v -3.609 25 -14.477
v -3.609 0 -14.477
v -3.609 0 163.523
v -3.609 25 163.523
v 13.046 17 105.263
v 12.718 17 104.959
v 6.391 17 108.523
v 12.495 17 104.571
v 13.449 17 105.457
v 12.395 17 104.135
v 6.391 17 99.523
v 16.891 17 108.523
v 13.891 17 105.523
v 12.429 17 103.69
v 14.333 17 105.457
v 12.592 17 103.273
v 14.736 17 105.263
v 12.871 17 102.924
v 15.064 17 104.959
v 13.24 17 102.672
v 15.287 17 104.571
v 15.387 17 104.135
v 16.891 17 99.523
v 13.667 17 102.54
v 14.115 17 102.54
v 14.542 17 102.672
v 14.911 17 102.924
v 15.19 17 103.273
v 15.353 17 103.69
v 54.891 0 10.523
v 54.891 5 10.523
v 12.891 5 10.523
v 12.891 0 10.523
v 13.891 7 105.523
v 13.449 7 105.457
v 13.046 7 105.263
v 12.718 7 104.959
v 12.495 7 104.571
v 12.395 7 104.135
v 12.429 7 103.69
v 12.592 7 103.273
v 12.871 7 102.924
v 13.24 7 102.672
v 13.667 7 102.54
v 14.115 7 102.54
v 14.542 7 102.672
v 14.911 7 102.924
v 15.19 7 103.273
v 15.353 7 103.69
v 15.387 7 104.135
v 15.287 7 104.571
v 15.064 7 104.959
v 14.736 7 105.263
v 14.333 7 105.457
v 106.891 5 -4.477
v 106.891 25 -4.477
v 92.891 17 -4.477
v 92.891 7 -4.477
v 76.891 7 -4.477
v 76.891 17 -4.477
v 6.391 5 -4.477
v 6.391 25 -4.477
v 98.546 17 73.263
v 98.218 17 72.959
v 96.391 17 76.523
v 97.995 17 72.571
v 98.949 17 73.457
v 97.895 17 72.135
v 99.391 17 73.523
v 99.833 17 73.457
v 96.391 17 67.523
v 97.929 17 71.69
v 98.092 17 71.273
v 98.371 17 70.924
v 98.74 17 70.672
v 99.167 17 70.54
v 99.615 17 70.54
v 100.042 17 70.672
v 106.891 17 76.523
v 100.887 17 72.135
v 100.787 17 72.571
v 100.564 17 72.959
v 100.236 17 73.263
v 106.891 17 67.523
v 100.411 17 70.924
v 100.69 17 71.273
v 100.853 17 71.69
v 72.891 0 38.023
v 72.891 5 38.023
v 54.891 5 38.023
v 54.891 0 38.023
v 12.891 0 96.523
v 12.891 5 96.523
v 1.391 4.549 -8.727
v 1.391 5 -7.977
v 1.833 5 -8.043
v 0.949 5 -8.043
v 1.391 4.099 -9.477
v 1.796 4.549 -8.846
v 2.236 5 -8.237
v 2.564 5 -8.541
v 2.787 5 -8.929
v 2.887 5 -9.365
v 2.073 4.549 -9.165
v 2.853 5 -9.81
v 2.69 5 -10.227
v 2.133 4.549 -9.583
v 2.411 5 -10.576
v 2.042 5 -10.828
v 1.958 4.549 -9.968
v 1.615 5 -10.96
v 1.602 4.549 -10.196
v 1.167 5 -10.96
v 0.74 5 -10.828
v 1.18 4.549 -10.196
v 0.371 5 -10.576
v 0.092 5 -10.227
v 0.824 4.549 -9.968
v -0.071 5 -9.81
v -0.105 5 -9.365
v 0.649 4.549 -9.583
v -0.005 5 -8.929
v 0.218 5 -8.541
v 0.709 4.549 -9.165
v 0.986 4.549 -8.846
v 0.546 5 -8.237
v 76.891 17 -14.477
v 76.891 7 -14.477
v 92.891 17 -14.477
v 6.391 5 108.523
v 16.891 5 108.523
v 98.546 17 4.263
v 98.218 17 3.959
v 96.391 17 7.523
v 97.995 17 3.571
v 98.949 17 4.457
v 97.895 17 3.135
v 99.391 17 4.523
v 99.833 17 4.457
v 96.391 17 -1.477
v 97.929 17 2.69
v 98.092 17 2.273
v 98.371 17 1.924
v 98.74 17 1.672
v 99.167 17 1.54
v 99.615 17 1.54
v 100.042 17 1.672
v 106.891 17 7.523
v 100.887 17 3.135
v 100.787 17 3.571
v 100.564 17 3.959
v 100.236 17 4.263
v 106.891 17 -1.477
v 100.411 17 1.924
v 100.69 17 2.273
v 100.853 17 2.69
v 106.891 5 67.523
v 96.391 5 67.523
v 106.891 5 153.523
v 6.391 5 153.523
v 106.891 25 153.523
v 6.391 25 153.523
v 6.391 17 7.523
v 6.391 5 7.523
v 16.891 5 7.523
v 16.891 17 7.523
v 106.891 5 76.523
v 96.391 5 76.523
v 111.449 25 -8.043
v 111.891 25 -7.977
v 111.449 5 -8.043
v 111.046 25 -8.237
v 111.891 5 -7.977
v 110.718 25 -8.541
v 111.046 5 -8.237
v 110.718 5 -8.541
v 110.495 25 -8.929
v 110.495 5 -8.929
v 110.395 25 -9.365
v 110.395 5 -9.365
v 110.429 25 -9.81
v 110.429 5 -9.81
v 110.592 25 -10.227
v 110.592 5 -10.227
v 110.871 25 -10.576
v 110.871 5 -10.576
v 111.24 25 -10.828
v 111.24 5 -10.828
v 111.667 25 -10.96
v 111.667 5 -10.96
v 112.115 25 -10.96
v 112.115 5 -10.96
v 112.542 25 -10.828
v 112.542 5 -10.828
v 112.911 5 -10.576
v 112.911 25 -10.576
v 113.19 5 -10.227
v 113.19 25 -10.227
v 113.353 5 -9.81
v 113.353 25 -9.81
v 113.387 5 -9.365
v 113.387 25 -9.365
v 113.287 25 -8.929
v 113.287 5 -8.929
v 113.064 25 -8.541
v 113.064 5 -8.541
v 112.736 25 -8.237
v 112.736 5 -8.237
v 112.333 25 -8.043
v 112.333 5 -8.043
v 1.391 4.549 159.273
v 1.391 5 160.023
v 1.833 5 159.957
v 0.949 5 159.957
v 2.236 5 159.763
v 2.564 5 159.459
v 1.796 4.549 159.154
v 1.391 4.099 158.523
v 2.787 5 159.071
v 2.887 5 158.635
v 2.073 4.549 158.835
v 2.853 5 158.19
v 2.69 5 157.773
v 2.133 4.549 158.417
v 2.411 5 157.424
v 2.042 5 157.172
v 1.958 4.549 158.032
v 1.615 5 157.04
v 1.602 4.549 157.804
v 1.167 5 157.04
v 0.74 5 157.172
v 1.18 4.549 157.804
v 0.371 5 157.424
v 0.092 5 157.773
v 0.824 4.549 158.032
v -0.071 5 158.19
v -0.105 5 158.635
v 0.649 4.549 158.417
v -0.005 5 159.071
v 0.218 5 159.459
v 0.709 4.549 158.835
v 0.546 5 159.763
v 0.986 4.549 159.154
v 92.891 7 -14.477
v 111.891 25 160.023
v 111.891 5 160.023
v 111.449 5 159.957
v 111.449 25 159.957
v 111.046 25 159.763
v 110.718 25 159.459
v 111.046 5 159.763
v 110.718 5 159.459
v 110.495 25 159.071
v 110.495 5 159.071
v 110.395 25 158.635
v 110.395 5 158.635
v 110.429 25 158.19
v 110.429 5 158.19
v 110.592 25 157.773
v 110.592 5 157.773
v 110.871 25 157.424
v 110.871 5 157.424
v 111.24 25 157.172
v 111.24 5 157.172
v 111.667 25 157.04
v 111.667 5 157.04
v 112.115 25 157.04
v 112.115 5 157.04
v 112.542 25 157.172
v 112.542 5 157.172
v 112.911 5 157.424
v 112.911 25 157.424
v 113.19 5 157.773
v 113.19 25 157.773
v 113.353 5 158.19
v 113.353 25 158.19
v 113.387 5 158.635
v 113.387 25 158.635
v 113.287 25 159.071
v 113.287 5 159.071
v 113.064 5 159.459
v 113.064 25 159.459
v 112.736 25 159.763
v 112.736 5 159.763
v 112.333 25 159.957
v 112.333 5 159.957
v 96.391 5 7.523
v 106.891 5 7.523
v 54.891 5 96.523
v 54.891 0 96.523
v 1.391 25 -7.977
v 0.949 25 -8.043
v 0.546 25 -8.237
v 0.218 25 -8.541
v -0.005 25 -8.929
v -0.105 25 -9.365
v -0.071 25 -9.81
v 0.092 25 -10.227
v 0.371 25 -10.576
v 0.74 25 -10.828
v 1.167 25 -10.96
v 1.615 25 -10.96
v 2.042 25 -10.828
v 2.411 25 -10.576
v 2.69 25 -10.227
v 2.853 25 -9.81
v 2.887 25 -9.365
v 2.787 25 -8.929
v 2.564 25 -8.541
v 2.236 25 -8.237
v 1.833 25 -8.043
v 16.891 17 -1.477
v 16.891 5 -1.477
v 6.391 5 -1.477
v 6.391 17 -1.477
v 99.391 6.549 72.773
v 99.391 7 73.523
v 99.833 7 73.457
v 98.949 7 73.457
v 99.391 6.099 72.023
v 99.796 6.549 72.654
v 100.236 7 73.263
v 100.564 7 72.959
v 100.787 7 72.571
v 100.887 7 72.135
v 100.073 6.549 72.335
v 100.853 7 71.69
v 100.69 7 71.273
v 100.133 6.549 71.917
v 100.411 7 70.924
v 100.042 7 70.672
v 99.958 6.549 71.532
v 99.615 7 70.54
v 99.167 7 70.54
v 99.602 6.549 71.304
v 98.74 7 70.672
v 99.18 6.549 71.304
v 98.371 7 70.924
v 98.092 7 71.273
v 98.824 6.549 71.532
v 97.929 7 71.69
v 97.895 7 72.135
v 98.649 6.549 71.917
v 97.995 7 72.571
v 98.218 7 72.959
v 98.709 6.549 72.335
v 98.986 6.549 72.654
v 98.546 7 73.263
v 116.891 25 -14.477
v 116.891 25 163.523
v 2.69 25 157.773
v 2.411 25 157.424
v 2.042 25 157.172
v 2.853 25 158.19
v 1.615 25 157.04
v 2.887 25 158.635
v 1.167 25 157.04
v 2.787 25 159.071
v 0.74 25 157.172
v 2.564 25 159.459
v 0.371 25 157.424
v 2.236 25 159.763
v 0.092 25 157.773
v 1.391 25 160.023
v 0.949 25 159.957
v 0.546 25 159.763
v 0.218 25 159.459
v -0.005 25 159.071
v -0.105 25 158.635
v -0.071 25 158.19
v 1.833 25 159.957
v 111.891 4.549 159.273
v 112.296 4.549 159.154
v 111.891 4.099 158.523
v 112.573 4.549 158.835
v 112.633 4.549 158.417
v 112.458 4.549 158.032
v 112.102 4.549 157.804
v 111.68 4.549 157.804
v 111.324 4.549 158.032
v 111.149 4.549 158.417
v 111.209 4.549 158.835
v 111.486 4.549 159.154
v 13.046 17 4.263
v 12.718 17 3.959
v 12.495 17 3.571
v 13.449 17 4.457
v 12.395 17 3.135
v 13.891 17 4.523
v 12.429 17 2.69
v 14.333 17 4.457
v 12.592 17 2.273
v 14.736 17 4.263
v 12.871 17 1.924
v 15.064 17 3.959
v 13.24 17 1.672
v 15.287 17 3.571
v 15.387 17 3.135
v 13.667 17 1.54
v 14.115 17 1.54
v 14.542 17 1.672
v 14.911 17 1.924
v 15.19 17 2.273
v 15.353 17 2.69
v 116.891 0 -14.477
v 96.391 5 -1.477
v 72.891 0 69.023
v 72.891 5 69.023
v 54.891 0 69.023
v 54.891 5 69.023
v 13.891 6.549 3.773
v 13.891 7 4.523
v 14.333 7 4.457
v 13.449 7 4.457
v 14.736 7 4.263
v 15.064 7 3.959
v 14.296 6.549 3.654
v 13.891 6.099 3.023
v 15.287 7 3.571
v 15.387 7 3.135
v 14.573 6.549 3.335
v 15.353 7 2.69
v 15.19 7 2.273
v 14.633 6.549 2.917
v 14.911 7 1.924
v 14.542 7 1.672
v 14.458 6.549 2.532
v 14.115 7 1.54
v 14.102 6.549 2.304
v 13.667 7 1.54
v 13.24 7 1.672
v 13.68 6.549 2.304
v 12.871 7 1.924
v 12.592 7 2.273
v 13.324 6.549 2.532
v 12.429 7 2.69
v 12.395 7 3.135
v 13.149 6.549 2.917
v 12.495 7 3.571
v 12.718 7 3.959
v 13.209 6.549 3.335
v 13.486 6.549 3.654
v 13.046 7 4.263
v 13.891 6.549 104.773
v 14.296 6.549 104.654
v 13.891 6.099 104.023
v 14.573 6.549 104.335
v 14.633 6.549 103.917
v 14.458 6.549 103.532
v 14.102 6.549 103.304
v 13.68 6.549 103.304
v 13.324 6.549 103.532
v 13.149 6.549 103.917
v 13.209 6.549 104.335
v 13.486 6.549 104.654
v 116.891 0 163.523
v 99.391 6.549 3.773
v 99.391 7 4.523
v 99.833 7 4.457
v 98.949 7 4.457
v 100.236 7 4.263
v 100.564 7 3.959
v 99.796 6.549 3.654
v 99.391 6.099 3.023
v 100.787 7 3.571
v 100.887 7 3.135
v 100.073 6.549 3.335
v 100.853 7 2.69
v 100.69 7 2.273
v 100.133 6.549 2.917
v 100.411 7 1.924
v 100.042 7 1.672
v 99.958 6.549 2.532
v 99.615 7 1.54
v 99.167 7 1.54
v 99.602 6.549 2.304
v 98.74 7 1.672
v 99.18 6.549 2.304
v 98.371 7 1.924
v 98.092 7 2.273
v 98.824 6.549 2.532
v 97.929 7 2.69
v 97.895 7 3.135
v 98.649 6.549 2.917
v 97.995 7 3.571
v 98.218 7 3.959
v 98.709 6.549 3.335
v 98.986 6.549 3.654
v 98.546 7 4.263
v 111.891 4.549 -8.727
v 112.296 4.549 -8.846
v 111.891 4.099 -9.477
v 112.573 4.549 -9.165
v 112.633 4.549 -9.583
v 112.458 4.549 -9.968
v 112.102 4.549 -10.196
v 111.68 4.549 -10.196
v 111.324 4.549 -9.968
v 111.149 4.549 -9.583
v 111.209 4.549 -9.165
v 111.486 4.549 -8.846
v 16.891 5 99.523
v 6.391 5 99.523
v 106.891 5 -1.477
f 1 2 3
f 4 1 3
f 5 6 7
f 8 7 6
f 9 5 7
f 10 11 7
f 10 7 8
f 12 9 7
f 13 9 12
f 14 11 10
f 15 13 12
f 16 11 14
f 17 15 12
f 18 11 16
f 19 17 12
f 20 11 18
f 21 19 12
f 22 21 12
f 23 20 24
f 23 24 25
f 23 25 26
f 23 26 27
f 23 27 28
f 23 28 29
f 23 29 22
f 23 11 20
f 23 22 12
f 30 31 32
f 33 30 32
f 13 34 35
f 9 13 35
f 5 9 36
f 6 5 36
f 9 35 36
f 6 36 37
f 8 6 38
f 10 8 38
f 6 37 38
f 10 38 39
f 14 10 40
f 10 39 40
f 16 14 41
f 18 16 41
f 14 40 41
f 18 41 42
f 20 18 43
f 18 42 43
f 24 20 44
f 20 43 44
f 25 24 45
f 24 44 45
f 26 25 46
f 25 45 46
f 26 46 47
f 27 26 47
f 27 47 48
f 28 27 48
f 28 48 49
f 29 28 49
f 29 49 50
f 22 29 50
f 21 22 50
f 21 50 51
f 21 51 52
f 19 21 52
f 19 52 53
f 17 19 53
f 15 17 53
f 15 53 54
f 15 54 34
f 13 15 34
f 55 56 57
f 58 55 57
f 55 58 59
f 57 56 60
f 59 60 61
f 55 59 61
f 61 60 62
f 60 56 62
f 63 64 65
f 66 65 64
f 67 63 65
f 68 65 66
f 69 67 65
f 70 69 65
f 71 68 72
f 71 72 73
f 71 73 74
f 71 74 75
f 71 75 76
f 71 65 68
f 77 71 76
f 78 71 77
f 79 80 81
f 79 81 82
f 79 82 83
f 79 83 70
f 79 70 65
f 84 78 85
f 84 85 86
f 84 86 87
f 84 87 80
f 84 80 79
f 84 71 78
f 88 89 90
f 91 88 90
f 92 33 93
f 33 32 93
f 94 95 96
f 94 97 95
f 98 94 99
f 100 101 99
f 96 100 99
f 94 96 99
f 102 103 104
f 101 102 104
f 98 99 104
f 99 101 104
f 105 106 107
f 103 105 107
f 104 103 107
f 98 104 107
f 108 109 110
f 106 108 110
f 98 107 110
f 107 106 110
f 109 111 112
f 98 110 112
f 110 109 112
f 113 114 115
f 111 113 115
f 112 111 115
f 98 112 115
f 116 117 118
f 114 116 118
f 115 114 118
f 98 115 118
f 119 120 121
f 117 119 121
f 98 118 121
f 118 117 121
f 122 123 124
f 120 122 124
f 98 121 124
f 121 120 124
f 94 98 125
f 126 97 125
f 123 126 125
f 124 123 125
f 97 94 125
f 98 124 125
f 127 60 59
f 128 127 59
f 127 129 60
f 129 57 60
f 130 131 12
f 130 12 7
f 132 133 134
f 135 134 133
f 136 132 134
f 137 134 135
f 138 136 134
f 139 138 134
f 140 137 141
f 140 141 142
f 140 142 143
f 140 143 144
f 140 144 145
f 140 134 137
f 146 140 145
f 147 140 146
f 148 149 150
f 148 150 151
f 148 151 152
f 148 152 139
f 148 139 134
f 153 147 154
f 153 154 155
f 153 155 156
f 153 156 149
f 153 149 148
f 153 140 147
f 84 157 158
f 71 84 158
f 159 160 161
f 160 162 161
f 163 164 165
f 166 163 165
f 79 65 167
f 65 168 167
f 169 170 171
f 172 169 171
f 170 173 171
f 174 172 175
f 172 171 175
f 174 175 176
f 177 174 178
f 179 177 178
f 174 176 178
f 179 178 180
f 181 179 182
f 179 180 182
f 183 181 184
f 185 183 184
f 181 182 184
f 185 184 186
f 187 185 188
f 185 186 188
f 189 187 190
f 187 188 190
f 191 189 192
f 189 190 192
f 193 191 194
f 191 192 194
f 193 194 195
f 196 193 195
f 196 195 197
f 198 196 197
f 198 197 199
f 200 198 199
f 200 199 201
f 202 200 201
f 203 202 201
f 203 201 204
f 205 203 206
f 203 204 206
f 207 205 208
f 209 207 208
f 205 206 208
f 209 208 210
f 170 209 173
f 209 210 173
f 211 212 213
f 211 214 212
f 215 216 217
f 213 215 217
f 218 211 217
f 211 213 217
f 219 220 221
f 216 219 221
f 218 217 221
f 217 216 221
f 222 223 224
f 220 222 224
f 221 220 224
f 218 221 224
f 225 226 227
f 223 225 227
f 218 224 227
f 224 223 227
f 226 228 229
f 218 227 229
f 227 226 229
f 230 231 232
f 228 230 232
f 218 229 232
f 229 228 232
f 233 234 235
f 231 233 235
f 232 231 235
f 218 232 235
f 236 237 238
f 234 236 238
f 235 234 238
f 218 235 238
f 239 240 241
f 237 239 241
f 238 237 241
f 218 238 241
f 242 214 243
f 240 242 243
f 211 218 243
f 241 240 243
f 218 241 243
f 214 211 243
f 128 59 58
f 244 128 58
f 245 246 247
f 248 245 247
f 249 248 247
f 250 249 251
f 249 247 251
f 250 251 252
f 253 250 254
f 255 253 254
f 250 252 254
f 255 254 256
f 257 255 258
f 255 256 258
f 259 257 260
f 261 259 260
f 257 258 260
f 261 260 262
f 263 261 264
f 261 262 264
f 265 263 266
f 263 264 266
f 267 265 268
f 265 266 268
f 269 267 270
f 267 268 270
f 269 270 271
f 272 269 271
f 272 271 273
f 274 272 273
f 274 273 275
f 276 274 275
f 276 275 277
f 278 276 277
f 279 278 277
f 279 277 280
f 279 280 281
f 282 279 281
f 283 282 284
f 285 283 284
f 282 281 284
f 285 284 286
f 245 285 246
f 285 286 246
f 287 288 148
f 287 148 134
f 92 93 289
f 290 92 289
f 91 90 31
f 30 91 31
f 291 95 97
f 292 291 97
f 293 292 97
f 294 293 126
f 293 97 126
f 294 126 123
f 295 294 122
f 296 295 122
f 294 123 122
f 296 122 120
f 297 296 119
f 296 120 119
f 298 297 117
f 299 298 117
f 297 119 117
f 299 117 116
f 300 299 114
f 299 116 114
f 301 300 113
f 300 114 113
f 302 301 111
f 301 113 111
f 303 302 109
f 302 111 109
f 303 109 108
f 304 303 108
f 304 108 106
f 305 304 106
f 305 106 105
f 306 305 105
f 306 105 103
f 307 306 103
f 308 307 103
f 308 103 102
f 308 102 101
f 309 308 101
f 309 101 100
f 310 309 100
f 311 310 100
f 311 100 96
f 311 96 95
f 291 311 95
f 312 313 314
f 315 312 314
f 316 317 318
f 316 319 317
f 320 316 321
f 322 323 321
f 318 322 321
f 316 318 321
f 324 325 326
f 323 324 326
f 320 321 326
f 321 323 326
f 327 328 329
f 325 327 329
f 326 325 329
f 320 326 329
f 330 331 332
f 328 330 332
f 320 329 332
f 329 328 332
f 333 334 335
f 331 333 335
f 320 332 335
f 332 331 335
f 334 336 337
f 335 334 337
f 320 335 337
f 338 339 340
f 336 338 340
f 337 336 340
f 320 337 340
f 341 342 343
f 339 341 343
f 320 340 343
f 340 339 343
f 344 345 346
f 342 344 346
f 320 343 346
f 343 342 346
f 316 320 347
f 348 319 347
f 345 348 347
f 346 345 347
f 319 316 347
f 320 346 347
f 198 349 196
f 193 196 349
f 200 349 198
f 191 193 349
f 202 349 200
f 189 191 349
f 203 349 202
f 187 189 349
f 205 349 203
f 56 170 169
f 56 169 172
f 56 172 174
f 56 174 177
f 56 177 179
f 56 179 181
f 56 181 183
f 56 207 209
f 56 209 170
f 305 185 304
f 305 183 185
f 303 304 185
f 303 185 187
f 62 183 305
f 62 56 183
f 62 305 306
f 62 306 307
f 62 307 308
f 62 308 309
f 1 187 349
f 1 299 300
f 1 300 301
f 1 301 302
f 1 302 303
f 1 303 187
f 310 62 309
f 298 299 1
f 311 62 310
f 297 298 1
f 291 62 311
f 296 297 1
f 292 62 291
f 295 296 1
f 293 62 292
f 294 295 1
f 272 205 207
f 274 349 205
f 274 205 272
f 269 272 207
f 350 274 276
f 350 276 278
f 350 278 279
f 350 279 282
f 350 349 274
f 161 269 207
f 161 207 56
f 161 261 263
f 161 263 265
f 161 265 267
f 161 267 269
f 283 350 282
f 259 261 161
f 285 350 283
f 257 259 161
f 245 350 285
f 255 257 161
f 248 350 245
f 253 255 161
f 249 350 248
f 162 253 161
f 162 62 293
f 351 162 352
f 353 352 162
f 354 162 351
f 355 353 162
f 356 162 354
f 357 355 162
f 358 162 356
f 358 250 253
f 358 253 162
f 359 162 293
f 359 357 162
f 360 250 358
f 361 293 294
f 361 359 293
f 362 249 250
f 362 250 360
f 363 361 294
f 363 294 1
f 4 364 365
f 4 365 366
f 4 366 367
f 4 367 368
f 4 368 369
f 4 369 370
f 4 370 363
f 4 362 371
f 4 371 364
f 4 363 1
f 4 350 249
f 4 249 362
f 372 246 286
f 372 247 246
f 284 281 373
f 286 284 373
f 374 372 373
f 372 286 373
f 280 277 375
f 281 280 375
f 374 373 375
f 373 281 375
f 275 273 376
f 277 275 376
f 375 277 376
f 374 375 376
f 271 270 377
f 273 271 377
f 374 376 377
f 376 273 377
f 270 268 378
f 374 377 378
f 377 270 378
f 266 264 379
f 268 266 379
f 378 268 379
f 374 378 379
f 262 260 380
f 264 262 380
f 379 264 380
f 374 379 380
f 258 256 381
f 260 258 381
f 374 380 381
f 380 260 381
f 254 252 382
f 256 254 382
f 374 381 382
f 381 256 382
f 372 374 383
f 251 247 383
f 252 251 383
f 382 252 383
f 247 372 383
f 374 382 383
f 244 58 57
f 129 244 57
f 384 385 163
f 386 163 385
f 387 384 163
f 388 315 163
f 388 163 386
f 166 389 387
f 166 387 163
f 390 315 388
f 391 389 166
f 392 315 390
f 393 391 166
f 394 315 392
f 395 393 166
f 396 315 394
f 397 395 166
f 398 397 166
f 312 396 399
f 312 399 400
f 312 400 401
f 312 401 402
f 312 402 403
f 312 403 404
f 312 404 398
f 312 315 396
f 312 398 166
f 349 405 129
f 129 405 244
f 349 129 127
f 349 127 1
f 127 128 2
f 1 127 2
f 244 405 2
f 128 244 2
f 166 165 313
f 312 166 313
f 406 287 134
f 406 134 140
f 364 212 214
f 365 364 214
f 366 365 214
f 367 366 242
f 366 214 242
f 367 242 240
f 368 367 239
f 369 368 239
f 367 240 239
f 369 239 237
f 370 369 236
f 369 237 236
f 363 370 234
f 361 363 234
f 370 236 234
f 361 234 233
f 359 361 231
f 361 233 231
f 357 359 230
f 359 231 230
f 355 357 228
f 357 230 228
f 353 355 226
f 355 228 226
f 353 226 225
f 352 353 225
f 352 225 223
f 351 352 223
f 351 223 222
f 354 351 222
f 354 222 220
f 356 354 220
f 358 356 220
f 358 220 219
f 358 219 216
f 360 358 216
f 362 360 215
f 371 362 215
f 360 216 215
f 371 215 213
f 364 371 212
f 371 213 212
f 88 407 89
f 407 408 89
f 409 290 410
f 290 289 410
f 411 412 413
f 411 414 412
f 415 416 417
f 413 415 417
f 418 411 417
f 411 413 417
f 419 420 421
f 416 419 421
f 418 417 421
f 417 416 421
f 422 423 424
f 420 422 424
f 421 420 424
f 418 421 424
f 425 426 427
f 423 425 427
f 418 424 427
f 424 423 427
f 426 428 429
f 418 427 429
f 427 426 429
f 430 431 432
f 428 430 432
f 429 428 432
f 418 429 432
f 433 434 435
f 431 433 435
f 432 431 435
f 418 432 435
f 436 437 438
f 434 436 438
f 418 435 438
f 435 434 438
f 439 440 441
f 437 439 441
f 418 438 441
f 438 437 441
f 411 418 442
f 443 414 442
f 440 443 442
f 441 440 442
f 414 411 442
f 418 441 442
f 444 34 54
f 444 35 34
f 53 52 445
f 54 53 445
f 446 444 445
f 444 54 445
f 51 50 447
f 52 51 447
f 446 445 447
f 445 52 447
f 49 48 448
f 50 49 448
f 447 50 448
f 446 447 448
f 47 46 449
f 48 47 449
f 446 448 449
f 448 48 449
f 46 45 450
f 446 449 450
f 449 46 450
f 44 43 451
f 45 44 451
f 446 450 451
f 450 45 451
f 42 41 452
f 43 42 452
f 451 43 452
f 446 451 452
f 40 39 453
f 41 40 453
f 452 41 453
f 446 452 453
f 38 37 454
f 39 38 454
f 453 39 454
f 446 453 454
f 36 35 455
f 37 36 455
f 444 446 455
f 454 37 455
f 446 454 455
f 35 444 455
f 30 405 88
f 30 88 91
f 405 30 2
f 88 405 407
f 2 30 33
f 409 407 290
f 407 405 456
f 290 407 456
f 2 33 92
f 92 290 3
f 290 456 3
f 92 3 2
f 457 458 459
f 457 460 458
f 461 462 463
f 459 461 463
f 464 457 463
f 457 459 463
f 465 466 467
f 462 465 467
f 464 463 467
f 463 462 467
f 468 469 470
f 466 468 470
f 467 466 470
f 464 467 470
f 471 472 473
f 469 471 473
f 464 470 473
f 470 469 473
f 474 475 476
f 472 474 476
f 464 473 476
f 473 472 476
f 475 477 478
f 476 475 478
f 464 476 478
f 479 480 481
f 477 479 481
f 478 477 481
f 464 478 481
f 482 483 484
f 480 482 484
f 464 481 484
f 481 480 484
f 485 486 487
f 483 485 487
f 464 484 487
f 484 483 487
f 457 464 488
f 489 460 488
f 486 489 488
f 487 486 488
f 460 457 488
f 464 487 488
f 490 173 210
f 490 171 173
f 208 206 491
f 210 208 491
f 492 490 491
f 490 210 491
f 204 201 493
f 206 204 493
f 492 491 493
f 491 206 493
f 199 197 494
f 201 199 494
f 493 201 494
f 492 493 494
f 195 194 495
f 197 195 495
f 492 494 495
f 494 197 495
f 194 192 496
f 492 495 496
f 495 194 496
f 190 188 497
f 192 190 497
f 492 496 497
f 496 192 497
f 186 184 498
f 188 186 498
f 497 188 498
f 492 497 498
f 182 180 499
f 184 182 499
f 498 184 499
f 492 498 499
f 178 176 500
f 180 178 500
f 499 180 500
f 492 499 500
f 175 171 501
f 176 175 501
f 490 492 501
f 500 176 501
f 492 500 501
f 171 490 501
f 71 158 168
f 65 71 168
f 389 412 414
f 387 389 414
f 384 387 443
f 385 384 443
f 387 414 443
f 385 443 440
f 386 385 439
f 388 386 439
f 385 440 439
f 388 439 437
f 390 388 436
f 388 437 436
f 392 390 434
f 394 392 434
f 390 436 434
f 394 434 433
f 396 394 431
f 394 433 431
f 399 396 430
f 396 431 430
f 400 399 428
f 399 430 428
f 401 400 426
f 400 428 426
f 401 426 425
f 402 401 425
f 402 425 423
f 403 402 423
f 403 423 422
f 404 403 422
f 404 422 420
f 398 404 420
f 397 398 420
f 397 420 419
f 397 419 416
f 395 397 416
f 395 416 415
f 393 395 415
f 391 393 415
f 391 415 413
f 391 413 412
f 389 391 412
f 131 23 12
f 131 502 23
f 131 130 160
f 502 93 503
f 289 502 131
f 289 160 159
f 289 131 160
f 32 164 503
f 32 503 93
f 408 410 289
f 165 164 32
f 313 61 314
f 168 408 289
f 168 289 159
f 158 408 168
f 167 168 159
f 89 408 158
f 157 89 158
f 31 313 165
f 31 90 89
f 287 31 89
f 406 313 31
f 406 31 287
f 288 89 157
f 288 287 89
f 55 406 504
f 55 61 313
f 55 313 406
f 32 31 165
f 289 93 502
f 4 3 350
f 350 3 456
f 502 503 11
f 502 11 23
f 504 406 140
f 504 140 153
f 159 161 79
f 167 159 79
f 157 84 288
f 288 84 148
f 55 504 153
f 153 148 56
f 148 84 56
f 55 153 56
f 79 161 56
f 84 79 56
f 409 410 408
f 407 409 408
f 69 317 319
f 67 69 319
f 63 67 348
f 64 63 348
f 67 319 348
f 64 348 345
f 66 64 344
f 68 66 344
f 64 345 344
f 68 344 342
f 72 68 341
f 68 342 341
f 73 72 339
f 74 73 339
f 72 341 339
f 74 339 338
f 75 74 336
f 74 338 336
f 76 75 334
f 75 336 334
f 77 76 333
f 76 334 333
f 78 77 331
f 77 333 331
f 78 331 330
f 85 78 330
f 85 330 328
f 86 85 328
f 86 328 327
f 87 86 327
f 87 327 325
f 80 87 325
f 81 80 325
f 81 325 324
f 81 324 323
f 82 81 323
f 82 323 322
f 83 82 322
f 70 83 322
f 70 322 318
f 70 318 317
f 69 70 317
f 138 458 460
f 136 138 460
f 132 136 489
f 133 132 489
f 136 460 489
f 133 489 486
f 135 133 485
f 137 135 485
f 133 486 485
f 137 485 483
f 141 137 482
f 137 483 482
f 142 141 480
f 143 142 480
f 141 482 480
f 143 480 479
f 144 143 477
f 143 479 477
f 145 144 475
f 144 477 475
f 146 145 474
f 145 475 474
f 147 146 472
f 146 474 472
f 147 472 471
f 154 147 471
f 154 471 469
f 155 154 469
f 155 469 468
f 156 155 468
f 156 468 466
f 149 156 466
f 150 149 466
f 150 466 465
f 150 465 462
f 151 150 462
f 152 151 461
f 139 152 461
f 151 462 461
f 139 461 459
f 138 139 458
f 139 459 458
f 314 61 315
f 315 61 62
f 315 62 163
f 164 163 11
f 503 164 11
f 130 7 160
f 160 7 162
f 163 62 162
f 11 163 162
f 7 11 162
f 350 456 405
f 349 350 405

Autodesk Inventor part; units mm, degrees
ref_plane "YZ Plane" through (0, 0, 0) normal (1, 0, 0) x (0, 1, 0)
ref_plane "XZ Plane" through (0, 0, 0) normal (0, 1, 0) x (-1, 0, 0)
ref_plane "XY Plane" through (0, 0, 0) normal (0, 0, 1) x (1, 0, 0)
sketch "Sketch1" plane through (0, 0, 0) normal (0, 1, 0) x (-1, 0, 0)
  line L0 (3.609, 163.5234) -> (-116.891, 163.5234)
  line L1 (-116.891, 163.5234) -> (-116.891, -14.4766)
  line L2 (-116.891, -14.4766) -> (3.609, -14.4766)
  line L3 (3.609, -14.4766) -> (3.609, 163.5234)
  dimension "d1" = 178
  dimension "d2" = 120.5
extrude "Extrusion1" add sketch "Sketch1" along normal blind 25
sketch "Sketch2" plane through (0, 25, 0) normal (0, 1, 0) x (1, 0, 0)
  line L0 (6.391, -153.5234) -> (106.891, -153.5234)
  line L1 (106.891, -153.5234) -> (106.891, 4.4766)
  line L2 (106.891, 4.4766) -> (6.391, 4.4766)
  line L3 (6.391, 4.4766) -> (6.391, -153.5234)
  line L4 (-3.609, -163.5234) -> (116.891, -163.5234) projected
  line L5 (116.891, -163.5234) -> (116.891, 14.4766) projected
  point P0 (0, 0)
  dimension "d5" = 158
  dimension "d6" = 100.5
  dimension "d7" = 10
  dimension "d8" = 10
extrude "Extrusion2" cut sketch "Sketch2" against normal blind 20
sketch "Sketch3" plane through (0, 5, 0) normal (0, 1, 0) x (1, 0, 0)
  line L0 (12.891, -96.5234) -> (54.891, -96.5234)
  line L1 (54.891, -96.5234) -> (54.891, -10.5234)
  line L2 (54.891, -10.5234) -> (12.891, -10.5234)
  line L3 (12.891, -10.5234) -> (12.891, -96.5234)
  line L4 (106.891, -153.5234) -> (6.391, -153.5234) projected
  line L5 (6.391, 4.4766) -> (106.891, 4.4766) projected
  line L6 (6.391, -153.5234) -> (6.391, 4.4766) projected
  line L7 (54.891, -69.0234) -> (72.891, -69.0234)
  line L8 (72.891, -69.0234) -> (72.891, -38.0234)
  line L9 (72.891, -38.0234) -> (54.891, -38.0234)
  line L10 (54.891, -38.0234) -> (54.891, -69.0234)
  line L11 (106.891, 4.4766) -> (106.891, -153.5234) projected
  line L12 (12.891, -55.0234) -> (106.891, -55.0234)
  point P0 (0, 0)
  dimension "d11" = 57
  dimension "d12" = 15
  dimension "d13" = 6.5
  dimension "d14" = 0
  dimension "d15" = 42
  dimension "d16" = 34
  dimension "d17" = 42.5
  dimension "d18" = 84.5
  dimension "d19" = 41.5
  dimension "d20" = 44.5
  dimension "d21" = 14
extrude "Extrusion3" cut sketch "Sketch3" against normal through all contours L3 L12 L1 L0 | L3 L2 L1 L12 | L1 L12 L8 L7 | L1 L9 L8 L12
sketch "Sketch4" plane through (0, 5, 0) normal (0, 1, 0) x (1, 0, 0)
  line L0 (6.391, -7.5234) -> (16.891, -7.5234)
  line L1 (16.891, -7.5234) -> (16.891, 1.4766)
  line L2 (16.891, 1.4766) -> (6.391, 1.4766)
  line L3 (6.391, 1.4766) -> (6.391, -7.5234)
  line L4 (6.391, -153.5234) -> (6.391, 4.4766) projected
  line L5 (6.391, 4.4766) -> (106.891, 4.4766) projected
  line L6 (6.391, -153.5234) -> (6.391, 4.4766) projected
  line L7 (6.391, -53.5234) -> (106.891, -53.5234)
  line L8 (12.891, -10.5234) -> (54.891, -10.5234) projected
  line L9 (6.391, -99.5234) -> (16.891, -99.5234)
  line L10 (16.891, -99.5234) -> (16.891, -108.5234)
  line L11 (16.891, -108.5234) -> (6.391, -108.5234)
  line L12 (6.391, -108.5234) -> (6.391, -99.5234)
  line L13 (106.891, -153.5234) -> (6.391, -153.5234) projected
  line L14 (56.641, -153.5234) -> (56.641, 4.4766)
  line L15 (6.391, 4.4766) -> (106.891, 4.4766) projected
  line L16 (-3.609, 14.4766) -> (-3.609, -163.5234) projected
  line L17 (106.891, -7.5234) -> (96.391, -7.5234)
  line L18 (96.391, -7.5234) -> (96.391, 1.4766)
  line L19 (96.391, 1.4766) -> (106.891, 1.4766)
  line L20 (106.891, 1.4766) -> (106.891, -7.5234)
  line L21 (108.391, -37.5234) -> (6.391, -37.5234)
  line L22 (106.891, -67.5234) -> (96.391, -67.5234)
  line L23 (106.891, -76.5234) -> (106.891, -67.5234)
  line L24 (96.391, -67.5234) -> (96.391, -76.5234)
  line L25 (96.391, -76.5234) -> (106.891, -76.5234)
  line L26 (54.891, -96.5234) -> (12.891, -96.5234) projected
  point P0 (0, 0)
  dimension "d24" = 0
  dimension "d25" = 10.5
  dimension "d26" = 9
  dimension "d27" = 3
  dimension "d28" = 43
  dimension "d29" = 60.25
  dimension "d30" = 30
  dimension "d37" = 43
extrude "Extrusion4" add sketch "Sketch4" along normal blind 12 contours L3 L2 L1 L0 | L9 L10 L11 L4 | L17 L18 L19 L20 | L23 L25 L24 L22
sketch "Sketch6" plane through (0, 17, 0) normal (0, 1, 0) x (1, 0, 0)
  circle A0 centre (13.891, -3.0234) radius 1.5
  line L0 (6.391, -153.5234) -> (6.391, 4.4766) projected
  line L1 (16.891, 1.4766) -> (6.391, 1.4766) projected
  line L2 (6.391, -53.5234) -> (108.8142, -53.5234)
  line L3 (12.891, -10.5234) -> (54.891, -10.5234) projected
  line L4 (6.391, -108.5234) -> (16.891, -108.5234) projected
  circle A1 centre (13.891, -104.0234) radius 1.5
  line L5 (56.641, -153.5234) -> (56.641, 4.4766)
  line L6 (-3.609, 14.4766) -> (-3.609, -163.5234) projected
  circle A2 centre (99.391, -3.0234) radius 1.5
  line L7 (106.891, -7.5234) -> (106.891, -67.5234) projected
  line L8 (106.891, -37.5234) -> (6.391, -37.5234)
  line L9 (96.391, -7.5234) -> (106.891, -7.5234) projected
  circle A3 centre (99.391, -72.0234) radius 1.5
  line L10 (106.891, 4.4766) -> (106.891, -153.5234) projected
  line L11 (106.891, 1.4766) -> (96.391, 1.4766) projected
  point P0 (0, 0)
  dimension "d33" = 3
  dimension "d34" = 7.5
  dimension "d35" = 4.5
  dimension "d36" = 43
  dimension "d38" = 110
  dimension "d39" = 4.5
  dimension "d40" = 7.5
  dimension "d41" = 60.25
  dimension "d42" = 30
  dimension "d43" = 69
  dimension "d44" = 7.5
  dimension "d45" = 7.5
  dimension "d46" = 4.5
hole "Hole1" at (13.891, 17, 3.0234) at (13.891, 17, 104.0234) at (99.391, 17, 72.0234) at (99.391, 17, 3.0234) direction (0, -1, 0) diameter 3 depth 10 tip angle 118
thread "Thread1" size "M3x0.5" class "6H" standard "ANSI Metric M Profile" full length
thread "Thread2" size "M3x0.5" class "6H" standard "ANSI Metric M Profile" full length
thread "Thread3" size "M3x0.5" class "6H" standard "ANSI Metric M Profile" full length
thread "Thread4" size "M3x0.5" class "6H" standard "ANSI Metric M Profile" full length
sketch "Sketch7" plane through (0, 25, 0) normal (0, 1, 0) x (1, 0, 0)
  circle A0 centre (1.391, -158.5234) radius 1.5
  line L0 (-3.609, -163.5234) -> (116.891, -163.5234) projected
  line L1 (-3.609, 14.4766) -> (-3.609, -163.5234) projected
  line L2 (-3.609, 14.4766) -> (-3.609, -163.5234) projected
  line L3 (-3.609, -74.5234) -> (116.891, -74.5234)
  line L4 (116.891, -163.5234) -> (116.891, 14.4766) projected
  circle A1 centre (1.391, 9.4766) radius 1.5
  line L5 (56.641, -163.5234) -> (56.641, 14.4766)
  line L6 (116.891, 14.4766) -> (-3.609, 14.4766) projected
  circle A2 centre (111.891, -158.5234) radius 1.5
  circle A3 centre (111.891, 9.4766) radius 1.5
  point P0 (0, 0)
  dimension "d62" = 3
  dimension "d63" = 5
  dimension "d64" = 5
  dimension "d65" = 89
  dimension "d66" = 60.25
hole "Hole2" at (1.391, 25, 158.5234) at (1.391, 25, -9.4766) at (111.891, 25, -9.4766) at (111.891, 25, 158.5234) direction (0, -1, 0) diameter 3 depth 20 tip angle 118
thread "Thread5" size "M3x0.5" class "6H" standard "ANSI Metric M Profile" full length
thread "Thread6" size "M3x0.5" class "6H" standard "ANSI Metric M Profile" full length
thread "Thread7" size "M3x0.5" class "6H" standard "ANSI Metric M Profile" full length
thread "Thread8" size "M3x0.5" class "6H" standard "ANSI Metric M Profile" full length
sketch "Sketch8" plane through (6.391, 25, -4.4766) normal (0, 0, 1) x (1, 0, 0)
  line L0 (70.5, -18) -> (86.5, -18)
  line L1 (86.5, -18) -> (86.5, -8)
  line L2 (86.5, -8) -> (70.5, -8)
  line L3 (70.5, -8) -> (70.5, -18)
  line L4 (100.5, 0) -> (100.5, -20) projected
  line L5 (0, 0) -> (100.5, 0) projected
  line L6 (0, -20) -> (100.5, -20) projected
  point P0 (-6.391, -25)
  dimension "d82" = 14
  dimension "d83" = 16
  dimension "d84" = 8
  dimension "d85" = 2
extrude "Extrusion5" cut sketch "Sketch8" against normal through all
properties part number "cabin_front"
